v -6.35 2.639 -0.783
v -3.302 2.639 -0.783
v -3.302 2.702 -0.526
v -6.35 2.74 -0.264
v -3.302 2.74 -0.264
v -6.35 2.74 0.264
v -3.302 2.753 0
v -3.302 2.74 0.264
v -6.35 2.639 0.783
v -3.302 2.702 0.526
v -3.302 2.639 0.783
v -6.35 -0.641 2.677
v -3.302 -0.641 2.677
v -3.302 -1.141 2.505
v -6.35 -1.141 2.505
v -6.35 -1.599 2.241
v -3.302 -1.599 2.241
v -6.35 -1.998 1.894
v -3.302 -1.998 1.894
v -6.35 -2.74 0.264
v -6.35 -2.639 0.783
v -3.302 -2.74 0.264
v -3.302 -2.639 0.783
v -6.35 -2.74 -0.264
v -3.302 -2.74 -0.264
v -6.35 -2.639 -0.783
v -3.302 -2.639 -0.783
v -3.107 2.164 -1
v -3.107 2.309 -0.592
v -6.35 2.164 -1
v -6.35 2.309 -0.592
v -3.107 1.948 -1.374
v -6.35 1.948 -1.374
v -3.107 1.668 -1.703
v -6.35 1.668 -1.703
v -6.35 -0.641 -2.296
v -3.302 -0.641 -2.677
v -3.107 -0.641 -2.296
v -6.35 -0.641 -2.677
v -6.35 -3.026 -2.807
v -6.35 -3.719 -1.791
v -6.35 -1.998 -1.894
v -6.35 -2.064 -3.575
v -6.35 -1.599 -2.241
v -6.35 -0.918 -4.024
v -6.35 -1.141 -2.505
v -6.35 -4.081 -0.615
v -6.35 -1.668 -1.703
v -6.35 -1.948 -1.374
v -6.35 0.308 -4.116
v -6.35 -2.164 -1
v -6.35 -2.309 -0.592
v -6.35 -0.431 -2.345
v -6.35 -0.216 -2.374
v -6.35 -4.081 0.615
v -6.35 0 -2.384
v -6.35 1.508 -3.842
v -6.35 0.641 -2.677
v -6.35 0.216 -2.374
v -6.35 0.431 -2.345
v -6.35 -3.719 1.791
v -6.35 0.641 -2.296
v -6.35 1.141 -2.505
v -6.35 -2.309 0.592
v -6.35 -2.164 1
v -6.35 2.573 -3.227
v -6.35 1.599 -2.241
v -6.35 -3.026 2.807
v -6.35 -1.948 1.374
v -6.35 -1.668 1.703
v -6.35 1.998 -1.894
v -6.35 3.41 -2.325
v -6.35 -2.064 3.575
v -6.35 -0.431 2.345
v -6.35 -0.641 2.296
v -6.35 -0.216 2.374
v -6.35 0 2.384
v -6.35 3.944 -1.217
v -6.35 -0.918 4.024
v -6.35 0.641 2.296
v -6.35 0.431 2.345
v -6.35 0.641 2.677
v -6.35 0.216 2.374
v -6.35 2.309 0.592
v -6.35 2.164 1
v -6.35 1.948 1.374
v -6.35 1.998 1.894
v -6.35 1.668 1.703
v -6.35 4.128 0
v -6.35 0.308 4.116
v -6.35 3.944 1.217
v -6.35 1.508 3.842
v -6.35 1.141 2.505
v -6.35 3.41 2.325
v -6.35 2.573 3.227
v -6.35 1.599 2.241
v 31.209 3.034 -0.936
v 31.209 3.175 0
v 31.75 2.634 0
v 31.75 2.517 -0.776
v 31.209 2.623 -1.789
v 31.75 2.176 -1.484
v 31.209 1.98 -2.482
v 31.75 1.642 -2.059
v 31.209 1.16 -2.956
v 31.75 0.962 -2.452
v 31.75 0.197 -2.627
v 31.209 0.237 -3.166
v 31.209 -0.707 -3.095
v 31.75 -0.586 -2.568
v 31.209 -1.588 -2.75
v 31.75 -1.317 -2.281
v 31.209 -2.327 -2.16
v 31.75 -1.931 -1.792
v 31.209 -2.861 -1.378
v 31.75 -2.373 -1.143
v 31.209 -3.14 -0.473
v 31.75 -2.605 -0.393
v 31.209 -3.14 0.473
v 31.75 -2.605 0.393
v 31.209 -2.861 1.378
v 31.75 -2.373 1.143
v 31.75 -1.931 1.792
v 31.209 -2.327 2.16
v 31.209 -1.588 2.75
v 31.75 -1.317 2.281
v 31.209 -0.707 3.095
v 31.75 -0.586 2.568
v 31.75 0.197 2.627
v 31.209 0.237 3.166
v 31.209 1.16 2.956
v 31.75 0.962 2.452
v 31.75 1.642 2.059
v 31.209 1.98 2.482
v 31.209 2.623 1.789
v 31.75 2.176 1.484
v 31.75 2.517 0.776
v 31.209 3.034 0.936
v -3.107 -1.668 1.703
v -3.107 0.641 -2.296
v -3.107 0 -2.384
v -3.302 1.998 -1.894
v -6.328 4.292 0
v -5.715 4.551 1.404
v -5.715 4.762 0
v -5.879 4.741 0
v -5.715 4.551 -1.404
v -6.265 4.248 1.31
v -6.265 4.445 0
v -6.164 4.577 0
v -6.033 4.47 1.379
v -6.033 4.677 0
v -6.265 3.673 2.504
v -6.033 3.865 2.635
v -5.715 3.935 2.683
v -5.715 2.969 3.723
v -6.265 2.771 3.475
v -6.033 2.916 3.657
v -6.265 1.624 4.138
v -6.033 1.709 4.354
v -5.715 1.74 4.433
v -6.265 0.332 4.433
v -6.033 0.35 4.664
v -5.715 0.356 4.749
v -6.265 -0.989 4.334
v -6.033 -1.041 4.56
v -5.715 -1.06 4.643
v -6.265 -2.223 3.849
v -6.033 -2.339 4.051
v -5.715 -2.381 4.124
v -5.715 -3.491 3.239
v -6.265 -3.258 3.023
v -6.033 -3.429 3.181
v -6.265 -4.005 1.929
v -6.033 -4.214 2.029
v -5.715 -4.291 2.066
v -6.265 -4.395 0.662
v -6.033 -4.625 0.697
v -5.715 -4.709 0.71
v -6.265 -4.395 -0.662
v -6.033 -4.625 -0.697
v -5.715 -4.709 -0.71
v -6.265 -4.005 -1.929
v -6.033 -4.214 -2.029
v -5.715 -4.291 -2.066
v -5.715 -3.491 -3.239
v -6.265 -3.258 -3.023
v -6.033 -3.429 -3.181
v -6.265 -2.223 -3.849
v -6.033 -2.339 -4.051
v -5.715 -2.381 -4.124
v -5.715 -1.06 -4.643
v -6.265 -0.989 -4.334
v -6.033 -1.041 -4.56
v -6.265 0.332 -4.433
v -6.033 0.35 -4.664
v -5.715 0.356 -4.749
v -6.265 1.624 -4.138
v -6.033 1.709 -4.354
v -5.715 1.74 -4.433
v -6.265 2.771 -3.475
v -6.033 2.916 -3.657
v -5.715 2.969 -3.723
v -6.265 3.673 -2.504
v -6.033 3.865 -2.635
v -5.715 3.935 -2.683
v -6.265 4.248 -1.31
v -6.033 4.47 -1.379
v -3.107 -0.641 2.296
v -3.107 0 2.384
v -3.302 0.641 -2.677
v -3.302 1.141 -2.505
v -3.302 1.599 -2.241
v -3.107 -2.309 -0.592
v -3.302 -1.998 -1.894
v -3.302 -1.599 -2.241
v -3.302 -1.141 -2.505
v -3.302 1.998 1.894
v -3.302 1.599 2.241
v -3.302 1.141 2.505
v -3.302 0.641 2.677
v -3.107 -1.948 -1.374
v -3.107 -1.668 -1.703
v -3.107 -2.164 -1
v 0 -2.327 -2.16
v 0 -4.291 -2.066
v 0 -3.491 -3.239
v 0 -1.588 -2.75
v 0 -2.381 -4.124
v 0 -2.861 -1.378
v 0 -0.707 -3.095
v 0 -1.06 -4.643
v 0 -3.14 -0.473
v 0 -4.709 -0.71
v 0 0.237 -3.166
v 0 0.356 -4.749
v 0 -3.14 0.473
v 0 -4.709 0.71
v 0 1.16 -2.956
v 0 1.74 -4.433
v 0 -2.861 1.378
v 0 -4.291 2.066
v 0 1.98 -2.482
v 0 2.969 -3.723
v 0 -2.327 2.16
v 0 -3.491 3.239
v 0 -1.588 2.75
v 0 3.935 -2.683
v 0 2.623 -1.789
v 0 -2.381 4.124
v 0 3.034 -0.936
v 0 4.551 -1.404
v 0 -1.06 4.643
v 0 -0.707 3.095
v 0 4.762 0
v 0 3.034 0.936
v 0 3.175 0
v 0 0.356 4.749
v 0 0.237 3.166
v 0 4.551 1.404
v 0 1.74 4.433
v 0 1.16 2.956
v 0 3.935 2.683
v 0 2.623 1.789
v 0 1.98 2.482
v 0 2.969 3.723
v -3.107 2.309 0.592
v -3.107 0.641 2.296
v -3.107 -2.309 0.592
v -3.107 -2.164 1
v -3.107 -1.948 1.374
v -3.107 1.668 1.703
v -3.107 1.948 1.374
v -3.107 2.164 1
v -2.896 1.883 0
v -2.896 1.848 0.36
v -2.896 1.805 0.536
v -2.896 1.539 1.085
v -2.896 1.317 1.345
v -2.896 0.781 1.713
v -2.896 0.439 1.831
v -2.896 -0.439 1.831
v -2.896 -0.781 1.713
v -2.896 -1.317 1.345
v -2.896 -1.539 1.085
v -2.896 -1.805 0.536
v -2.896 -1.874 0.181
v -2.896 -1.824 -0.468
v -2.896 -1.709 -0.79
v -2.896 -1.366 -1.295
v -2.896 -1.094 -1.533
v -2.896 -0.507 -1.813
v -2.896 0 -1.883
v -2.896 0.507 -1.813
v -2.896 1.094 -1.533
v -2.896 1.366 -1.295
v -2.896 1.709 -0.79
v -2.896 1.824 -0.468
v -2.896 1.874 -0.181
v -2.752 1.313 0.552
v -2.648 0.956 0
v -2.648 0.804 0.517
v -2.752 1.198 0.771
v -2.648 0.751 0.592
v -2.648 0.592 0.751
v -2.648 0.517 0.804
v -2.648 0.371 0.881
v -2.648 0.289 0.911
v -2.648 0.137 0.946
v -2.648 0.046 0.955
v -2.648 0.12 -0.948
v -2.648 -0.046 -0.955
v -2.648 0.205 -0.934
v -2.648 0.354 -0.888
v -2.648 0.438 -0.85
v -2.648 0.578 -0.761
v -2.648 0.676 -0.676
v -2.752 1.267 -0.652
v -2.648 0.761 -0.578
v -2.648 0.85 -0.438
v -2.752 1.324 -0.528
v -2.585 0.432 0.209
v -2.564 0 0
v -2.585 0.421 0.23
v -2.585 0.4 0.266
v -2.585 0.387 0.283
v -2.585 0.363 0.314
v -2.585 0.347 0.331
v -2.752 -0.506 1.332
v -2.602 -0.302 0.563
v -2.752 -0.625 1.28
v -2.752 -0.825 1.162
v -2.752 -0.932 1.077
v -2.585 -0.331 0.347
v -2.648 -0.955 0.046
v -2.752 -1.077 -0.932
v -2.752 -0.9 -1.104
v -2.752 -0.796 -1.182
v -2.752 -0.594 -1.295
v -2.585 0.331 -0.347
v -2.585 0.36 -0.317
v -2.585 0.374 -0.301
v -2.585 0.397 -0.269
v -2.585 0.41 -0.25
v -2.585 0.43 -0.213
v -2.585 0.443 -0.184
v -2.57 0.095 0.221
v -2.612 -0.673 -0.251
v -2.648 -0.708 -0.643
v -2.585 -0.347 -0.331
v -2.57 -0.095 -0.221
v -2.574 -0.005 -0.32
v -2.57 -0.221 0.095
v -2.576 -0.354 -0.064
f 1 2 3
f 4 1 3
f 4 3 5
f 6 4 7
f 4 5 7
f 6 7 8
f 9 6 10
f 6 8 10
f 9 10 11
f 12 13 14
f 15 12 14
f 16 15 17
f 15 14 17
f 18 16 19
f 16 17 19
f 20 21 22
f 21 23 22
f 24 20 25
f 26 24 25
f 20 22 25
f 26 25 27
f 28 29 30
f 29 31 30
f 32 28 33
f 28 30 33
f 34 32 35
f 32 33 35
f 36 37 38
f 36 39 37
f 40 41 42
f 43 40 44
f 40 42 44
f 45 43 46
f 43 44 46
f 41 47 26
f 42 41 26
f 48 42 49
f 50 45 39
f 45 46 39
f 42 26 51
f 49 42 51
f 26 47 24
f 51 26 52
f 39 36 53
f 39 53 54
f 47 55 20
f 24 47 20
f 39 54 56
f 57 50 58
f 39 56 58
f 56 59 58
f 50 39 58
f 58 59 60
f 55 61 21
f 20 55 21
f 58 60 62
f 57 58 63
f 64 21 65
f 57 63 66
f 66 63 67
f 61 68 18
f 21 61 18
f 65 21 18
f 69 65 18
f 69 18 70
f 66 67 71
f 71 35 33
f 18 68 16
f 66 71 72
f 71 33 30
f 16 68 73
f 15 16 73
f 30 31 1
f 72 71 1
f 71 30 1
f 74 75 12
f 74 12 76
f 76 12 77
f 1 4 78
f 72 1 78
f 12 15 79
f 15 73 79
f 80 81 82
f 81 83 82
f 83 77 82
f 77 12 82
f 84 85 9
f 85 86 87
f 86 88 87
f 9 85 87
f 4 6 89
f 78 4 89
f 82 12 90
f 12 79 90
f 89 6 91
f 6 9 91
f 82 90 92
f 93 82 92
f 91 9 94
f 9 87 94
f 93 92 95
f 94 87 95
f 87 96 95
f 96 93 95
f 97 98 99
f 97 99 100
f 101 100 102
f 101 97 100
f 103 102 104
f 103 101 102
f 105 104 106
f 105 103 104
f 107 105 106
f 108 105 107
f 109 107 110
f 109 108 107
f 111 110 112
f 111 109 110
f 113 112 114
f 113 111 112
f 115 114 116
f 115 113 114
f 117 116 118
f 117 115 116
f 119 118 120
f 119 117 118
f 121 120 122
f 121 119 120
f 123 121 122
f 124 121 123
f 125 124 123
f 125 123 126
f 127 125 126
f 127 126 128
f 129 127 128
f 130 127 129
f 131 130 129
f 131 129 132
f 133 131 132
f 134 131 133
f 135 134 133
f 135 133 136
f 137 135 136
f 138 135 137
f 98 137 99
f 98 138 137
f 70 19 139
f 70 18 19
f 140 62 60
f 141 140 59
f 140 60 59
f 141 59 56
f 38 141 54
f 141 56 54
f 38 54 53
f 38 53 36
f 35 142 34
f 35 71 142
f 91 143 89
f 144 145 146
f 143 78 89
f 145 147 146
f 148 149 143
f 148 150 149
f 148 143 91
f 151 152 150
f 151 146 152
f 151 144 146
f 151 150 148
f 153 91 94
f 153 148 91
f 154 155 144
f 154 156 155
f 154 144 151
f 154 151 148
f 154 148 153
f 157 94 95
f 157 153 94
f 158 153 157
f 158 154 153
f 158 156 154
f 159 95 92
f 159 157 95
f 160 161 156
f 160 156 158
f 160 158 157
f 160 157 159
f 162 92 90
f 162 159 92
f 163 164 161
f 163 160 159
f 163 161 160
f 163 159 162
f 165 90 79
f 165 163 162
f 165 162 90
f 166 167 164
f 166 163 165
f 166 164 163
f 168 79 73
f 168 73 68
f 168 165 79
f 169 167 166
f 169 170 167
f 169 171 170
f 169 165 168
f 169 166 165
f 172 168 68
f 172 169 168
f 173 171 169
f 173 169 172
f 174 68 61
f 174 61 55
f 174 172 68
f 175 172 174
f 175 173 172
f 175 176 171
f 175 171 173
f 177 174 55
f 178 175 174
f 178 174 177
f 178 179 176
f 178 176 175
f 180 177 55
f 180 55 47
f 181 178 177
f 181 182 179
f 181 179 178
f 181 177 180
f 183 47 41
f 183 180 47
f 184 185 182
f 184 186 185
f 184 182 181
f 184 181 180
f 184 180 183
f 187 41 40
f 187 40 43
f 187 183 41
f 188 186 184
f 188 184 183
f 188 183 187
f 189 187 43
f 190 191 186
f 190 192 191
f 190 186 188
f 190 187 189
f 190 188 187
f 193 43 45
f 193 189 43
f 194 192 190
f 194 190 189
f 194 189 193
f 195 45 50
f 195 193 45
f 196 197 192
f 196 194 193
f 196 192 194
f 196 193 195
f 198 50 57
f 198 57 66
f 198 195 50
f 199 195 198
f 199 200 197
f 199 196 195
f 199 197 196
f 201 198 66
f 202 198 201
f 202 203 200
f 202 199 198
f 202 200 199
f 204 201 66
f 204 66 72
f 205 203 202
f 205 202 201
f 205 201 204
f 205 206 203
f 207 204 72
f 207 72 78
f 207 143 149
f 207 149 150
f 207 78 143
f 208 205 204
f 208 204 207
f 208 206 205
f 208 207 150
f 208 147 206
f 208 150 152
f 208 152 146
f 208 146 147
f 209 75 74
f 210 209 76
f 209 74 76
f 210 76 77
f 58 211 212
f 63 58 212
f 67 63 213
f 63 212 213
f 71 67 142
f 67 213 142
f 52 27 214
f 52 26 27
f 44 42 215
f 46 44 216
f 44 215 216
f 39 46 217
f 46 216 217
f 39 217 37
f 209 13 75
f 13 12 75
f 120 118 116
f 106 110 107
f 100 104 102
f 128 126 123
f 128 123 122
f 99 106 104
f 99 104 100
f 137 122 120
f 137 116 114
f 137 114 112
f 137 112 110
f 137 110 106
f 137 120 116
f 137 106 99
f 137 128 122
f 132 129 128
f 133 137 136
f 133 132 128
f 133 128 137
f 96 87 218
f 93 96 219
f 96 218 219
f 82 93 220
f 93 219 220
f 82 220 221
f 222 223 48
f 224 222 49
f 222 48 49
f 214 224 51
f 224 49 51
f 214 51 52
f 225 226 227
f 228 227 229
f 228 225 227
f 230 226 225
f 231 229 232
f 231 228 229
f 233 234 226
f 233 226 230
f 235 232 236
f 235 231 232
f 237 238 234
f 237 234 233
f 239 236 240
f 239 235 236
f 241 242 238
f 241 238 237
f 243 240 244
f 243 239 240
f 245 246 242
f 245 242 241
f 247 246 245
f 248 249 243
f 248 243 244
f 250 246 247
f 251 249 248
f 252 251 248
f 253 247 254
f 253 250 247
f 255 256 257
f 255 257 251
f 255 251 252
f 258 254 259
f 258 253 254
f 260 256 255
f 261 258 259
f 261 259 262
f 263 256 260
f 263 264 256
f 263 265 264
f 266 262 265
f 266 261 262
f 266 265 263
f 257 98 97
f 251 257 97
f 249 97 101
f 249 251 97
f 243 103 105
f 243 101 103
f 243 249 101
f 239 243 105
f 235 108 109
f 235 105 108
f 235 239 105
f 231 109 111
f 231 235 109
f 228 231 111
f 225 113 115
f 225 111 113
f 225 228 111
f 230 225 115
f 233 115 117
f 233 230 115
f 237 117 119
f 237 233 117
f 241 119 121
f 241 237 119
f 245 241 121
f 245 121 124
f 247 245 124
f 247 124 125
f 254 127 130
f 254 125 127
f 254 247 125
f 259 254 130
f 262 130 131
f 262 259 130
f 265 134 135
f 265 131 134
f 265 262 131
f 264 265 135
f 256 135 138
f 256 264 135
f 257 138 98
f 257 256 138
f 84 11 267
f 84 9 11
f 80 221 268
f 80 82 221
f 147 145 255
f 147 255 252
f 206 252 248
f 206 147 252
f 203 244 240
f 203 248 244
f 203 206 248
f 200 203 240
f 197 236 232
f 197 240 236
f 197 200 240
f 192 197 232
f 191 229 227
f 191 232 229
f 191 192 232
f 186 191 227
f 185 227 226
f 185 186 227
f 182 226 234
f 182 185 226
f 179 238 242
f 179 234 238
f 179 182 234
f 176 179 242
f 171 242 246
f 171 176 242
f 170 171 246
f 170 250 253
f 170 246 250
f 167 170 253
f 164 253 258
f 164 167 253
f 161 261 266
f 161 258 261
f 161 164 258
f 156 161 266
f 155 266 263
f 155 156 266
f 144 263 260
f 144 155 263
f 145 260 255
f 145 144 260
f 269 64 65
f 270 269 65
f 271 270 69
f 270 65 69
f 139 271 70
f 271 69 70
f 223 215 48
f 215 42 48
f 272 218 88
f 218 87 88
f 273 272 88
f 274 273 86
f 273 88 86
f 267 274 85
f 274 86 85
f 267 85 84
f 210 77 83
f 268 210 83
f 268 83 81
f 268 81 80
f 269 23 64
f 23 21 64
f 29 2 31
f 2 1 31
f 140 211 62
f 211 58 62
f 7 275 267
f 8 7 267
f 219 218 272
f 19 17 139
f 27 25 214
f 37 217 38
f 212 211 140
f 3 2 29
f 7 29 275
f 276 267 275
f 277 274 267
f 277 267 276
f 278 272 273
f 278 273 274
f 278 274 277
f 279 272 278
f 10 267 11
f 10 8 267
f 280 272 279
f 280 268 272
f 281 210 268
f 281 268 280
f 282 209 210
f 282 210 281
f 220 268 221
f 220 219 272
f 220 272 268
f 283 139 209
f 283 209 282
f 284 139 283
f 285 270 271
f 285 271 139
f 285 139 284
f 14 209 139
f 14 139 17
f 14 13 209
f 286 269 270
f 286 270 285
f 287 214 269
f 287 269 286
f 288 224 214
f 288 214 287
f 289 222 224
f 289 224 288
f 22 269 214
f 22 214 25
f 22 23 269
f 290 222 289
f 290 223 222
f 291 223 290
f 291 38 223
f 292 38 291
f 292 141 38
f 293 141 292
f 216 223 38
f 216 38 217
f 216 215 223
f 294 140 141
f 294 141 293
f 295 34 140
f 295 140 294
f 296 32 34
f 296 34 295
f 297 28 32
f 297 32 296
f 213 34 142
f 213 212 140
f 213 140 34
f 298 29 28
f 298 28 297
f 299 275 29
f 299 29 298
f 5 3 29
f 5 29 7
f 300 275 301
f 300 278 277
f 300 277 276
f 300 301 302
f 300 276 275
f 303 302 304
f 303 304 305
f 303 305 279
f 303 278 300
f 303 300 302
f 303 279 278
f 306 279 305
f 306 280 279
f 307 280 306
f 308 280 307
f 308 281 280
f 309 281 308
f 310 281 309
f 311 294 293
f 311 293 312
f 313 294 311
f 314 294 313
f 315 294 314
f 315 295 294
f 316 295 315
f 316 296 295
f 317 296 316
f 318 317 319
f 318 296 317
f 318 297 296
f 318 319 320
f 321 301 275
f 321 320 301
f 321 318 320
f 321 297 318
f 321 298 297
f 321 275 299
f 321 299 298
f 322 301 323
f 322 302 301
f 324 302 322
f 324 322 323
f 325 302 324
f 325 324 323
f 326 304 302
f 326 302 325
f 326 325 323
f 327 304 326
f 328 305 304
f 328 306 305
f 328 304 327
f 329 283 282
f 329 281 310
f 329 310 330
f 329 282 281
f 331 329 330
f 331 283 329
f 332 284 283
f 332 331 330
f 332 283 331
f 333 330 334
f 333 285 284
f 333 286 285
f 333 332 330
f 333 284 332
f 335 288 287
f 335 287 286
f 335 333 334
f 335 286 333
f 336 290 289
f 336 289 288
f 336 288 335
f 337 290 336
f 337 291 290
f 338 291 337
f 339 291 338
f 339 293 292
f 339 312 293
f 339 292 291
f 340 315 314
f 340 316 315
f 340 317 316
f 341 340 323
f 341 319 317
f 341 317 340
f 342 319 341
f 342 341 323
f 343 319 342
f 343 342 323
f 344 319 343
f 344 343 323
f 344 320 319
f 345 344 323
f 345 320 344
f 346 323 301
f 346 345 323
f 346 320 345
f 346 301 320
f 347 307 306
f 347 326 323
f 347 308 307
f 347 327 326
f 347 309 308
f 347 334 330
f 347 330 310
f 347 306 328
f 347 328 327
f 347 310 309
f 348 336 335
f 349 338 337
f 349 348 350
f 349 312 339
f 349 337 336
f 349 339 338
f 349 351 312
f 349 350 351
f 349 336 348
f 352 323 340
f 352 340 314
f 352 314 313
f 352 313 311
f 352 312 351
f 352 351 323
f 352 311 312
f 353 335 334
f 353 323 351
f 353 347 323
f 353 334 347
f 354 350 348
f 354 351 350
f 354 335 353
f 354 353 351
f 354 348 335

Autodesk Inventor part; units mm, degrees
ref_plane "YZ Plane" through (0, 0, 0) normal (1, 0, 0) x (0, 1, 0)
sketch "Sketch1" plane through (0, 0, 0) normal (0, 0, 1) x (1, 0, 0)
  line L0 (-6.35, 0) -> (31.75, 0)
  line L1 (31.75, 0) -> (31.75, 3.175)
  line L2 (31.75, 3.175) -> (0, 3.175)
  line L3 (0, 3.175) -> (0, 4.7625)
  line L4 (-16.0335, 0) -> (39.7139, 0) projected
  line L5 (0, -0.9525) -> (0, 5.715) projected
  line L6 (0, 4.7625) -> (-6.35, 4.7625)
  line L7 (-6.35, 0) -> (-6.35, 4.7625)
  arc A0 (-2.5645, 0) -> (-3.302, 2.7526) centre (-8.0696, 0) ccw
  line L8 (-6.35, 2.7526) -> (-3.302, 2.7526)
  line L9 (12.7, 3.175) -> (0, 3.175) construction
  dimension "d0" = 31.75
  dimension "d1" = 6.35
  dimension "d2" = 6.35
  dimension "d5" = 9.525
  dimension "d13" = 5.5051
  dimension "d14" = 5.5051
  dimension "d15" = 3.048
revolve "Body" add sketch "Sketch1" angle 360 about axis through (-6.35, 0, 0) along (1, 0, 0) contours A0 L8 L7 L6 L3 L5 L0 | L5 L2 L1 L0
ref_plane "IDS_WORKPLANE{1}" through (-6.35, 0, 0) normal (1, 0, 0) x (0, 0, -1)
sketch "Sketch2" plane through (-6.35, 0, 0) normal (1, 0, 0) x (0, 0, -1)
  line L0 (0, -6.6675) -> (0, 6.6675) projected
  line L1 (6.6675, 0) -> (-6.6675, 0) projected
  circle A0 centre (0, 0) radius 4.7625 projected
  line L2 (2.6768, 0.6414) -> (2.2959, 0.6414)
  line L3 (0, 0) -> (2.6768, 0.6414) construction
  line L4 (0, 0) -> (4.0727, 3.8613) construction
  line L5 (0, 0) -> (0.783, 2.6389) construction
  line L6 (0, 0) -> (1.3763, 2.3838) construction
  line L7 (0.783, 2.6389) -> (0.5925, 2.309)
  line L8 (1.8938, 1.9975) -> (1.7034, 1.6676)
  line L9 (0, 0) -> (1.8938, 1.9975) construction
  arc A1 (2.3838, 0) -> (2.2959, 0.6414) centre (0, 0) ccw
  arc A2 (1.7034, 1.6676) -> (0.5925, 2.309) centre (0, 0) ccw
  arc A3 (2.7526, 0) -> (2.6768, 0.6414) centre (0, 0) ccw
  arc A4 (1.8938, 1.9975) -> (0.783, 2.6389) centre (0, 0) ccw
  arc A5 (2.6768, 0.6414) -> (1.6232, 2.223) centre (0, 0) ccw construction
  arc A6 (2.2959, 0.6414) -> (1.7034, 1.6676) centre (0, 0) ccw construction
  line L10 (2.6768, -0.6414) -> (2.2959, -0.6414)
  line L11 (0.783, -2.6389) -> (0.5925, -2.309)
  line L12 (1.8938, -1.9975) -> (1.7034, -1.6676)
  arc A7 (2.2959, -0.6414) -> (2.3838, 0) centre (0, 0) ccw
  arc A8 (0.5925, -2.309) -> (1.7034, -1.6676) centre (0, 0) ccw
  arc A9 (2.6768, -0.6414) -> (2.7526, 0) centre (0, 0) ccw
  arc A10 (0.783, -2.6389) -> (1.8938, -1.9975) centre (0, 0) ccw
  line L13 (-2.6768, 0.6414) -> (-2.2959, 0.6414)
  line L14 (-0.783, 2.6389) -> (-0.5925, 2.309)
  line L15 (-1.8938, 1.9975) -> (-1.7034, 1.6676)
  arc A11 (-2.2959, 0.6414) -> (-2.3838, 0) centre (0, 0) ccw
  arc A12 (-0.5925, 2.309) -> (-1.7034, 1.6676) centre (0, 0) ccw
  arc A13 (-2.6768, 0.6414) -> (-2.7526, 0) centre (0, 0) ccw
  arc A14 (-0.783, 2.6389) -> (-1.8938, 1.9975) centre (0, 0) ccw
  line L16 (-0.783, -2.6389) -> (-0.5925, -2.309)
  arc A15 (-1.7034, -1.6676) -> (-0.5925, -2.309) centre (0, 0) ccw
  line L17 (-1.8938, -1.9975) -> (-1.7034, -1.6676)
  arc A16 (-1.8938, -1.9975) -> (-0.783, -2.6389) centre (0, 0) ccw
  arc A17 (-2.3838, 0) -> (-2.2959, -0.6414) centre (0, 0) ccw
  line L18 (-2.6768, -0.6414) -> (-2.2959, -0.6414)
  arc A18 (-2.7526, 0) -> (-2.6768, -0.6414) centre (0, 0) ccw
  point P0 (1.3763, -2.3838)
  point P1 (-1.3763, 2.3838)
  point P2 (-1.3763, -2.3838)
  dimension "d19" = 0.6413
  dimension "d20" = 1.2827
  dimension "d21" = 33.052
  dimension "d22" = 5.5051
  dimension "d23" = 4.7676
extrude "Slot" add sketch "Sketch2" along normal up to next contours A1 L2 A3 L1 | L1 A9 L10 A7 | A17 L18 A18 L1 | L1 A13 L13 A11 | A4 L8 A2 L7 | L11 A8 L12 A10 | L14 A12 L15 A14 | A16 L17 A15 L16
fillet "Fillet1" radius 0.635 1 edges at (-6.35, -4.7625, 0)
thread "Thread" size "1/4-28 UNF" class "2A" standard "ANSI Unified Screw Threads" length 30.3893
chamfer "Chamfer1" distance 0.541 distance2 0.541 1 edges at (31.75, -3.175, 0) measured on face at (31.75, -0.3658, -0.0841)
ref_plane "Work Plane2" through (-3.175, 0, 0) normal (0, 0, -1) x (1, 0, 0)
equation "\"d19\" = 0.5 * SBR"
equation "\"d20\" = SBR"
equation "\"d22\" = 1.1547 * SW"
equation "\"d23\" = SW"
equation "\"d17\" = INTI"
equation "\"d24\" = RR"
equation "\"d6\" = GEL"
equation "\"d9\" = -0.5 * SPD + 0.5 * NND"
equation "\"d10\" = GUL"
equation "\"d0\" = NLG"
equation "\"d1\" = KOH"
equation "\"d2\" = NND"
equation "\"d5\" = KOD"
equation "\"d13\" = 1.1547 * SW"
equation "\"d14\" = 1.1547 * SW"
equation "\"d15\" = INTI"
equation "\"NND\" = 6.35"
equation "\"NLG\" = 31.75"
equation "\"GEL\" = 30.38932"
equation "\"KOD\" = 9.525"
equation "\"KOH\" = 6.35"
equation "\"SPD\" = GD1"
equation "\"GUL\" = 0.54102"
equation "\"SBR\" = 1.2827"
equation "\"INTI\" = 3.048"
equation "\"d11\" = -KOH"
equation "\"SW\" = 4.76758"
equation "\"d16\" = 1.1547 * SW"
equation "\"d18\" = SW"
equation "\"RR\" = 0.635"
equation "\"TOA\" = 30deg"
equation "\"GD1\" = 5.26796"
equation "\"THREADDIA\" = 6.35"
equation "\"BDM\" = NND"
equation "\"GD\" = NND"
equation "\"GAL\" = 1.36068"
equation "\"E0\" = 5.55498"
properties part number "ANSI B18.3 - 1/4-28 UNF - 1.25" material "Steel, Mild"
